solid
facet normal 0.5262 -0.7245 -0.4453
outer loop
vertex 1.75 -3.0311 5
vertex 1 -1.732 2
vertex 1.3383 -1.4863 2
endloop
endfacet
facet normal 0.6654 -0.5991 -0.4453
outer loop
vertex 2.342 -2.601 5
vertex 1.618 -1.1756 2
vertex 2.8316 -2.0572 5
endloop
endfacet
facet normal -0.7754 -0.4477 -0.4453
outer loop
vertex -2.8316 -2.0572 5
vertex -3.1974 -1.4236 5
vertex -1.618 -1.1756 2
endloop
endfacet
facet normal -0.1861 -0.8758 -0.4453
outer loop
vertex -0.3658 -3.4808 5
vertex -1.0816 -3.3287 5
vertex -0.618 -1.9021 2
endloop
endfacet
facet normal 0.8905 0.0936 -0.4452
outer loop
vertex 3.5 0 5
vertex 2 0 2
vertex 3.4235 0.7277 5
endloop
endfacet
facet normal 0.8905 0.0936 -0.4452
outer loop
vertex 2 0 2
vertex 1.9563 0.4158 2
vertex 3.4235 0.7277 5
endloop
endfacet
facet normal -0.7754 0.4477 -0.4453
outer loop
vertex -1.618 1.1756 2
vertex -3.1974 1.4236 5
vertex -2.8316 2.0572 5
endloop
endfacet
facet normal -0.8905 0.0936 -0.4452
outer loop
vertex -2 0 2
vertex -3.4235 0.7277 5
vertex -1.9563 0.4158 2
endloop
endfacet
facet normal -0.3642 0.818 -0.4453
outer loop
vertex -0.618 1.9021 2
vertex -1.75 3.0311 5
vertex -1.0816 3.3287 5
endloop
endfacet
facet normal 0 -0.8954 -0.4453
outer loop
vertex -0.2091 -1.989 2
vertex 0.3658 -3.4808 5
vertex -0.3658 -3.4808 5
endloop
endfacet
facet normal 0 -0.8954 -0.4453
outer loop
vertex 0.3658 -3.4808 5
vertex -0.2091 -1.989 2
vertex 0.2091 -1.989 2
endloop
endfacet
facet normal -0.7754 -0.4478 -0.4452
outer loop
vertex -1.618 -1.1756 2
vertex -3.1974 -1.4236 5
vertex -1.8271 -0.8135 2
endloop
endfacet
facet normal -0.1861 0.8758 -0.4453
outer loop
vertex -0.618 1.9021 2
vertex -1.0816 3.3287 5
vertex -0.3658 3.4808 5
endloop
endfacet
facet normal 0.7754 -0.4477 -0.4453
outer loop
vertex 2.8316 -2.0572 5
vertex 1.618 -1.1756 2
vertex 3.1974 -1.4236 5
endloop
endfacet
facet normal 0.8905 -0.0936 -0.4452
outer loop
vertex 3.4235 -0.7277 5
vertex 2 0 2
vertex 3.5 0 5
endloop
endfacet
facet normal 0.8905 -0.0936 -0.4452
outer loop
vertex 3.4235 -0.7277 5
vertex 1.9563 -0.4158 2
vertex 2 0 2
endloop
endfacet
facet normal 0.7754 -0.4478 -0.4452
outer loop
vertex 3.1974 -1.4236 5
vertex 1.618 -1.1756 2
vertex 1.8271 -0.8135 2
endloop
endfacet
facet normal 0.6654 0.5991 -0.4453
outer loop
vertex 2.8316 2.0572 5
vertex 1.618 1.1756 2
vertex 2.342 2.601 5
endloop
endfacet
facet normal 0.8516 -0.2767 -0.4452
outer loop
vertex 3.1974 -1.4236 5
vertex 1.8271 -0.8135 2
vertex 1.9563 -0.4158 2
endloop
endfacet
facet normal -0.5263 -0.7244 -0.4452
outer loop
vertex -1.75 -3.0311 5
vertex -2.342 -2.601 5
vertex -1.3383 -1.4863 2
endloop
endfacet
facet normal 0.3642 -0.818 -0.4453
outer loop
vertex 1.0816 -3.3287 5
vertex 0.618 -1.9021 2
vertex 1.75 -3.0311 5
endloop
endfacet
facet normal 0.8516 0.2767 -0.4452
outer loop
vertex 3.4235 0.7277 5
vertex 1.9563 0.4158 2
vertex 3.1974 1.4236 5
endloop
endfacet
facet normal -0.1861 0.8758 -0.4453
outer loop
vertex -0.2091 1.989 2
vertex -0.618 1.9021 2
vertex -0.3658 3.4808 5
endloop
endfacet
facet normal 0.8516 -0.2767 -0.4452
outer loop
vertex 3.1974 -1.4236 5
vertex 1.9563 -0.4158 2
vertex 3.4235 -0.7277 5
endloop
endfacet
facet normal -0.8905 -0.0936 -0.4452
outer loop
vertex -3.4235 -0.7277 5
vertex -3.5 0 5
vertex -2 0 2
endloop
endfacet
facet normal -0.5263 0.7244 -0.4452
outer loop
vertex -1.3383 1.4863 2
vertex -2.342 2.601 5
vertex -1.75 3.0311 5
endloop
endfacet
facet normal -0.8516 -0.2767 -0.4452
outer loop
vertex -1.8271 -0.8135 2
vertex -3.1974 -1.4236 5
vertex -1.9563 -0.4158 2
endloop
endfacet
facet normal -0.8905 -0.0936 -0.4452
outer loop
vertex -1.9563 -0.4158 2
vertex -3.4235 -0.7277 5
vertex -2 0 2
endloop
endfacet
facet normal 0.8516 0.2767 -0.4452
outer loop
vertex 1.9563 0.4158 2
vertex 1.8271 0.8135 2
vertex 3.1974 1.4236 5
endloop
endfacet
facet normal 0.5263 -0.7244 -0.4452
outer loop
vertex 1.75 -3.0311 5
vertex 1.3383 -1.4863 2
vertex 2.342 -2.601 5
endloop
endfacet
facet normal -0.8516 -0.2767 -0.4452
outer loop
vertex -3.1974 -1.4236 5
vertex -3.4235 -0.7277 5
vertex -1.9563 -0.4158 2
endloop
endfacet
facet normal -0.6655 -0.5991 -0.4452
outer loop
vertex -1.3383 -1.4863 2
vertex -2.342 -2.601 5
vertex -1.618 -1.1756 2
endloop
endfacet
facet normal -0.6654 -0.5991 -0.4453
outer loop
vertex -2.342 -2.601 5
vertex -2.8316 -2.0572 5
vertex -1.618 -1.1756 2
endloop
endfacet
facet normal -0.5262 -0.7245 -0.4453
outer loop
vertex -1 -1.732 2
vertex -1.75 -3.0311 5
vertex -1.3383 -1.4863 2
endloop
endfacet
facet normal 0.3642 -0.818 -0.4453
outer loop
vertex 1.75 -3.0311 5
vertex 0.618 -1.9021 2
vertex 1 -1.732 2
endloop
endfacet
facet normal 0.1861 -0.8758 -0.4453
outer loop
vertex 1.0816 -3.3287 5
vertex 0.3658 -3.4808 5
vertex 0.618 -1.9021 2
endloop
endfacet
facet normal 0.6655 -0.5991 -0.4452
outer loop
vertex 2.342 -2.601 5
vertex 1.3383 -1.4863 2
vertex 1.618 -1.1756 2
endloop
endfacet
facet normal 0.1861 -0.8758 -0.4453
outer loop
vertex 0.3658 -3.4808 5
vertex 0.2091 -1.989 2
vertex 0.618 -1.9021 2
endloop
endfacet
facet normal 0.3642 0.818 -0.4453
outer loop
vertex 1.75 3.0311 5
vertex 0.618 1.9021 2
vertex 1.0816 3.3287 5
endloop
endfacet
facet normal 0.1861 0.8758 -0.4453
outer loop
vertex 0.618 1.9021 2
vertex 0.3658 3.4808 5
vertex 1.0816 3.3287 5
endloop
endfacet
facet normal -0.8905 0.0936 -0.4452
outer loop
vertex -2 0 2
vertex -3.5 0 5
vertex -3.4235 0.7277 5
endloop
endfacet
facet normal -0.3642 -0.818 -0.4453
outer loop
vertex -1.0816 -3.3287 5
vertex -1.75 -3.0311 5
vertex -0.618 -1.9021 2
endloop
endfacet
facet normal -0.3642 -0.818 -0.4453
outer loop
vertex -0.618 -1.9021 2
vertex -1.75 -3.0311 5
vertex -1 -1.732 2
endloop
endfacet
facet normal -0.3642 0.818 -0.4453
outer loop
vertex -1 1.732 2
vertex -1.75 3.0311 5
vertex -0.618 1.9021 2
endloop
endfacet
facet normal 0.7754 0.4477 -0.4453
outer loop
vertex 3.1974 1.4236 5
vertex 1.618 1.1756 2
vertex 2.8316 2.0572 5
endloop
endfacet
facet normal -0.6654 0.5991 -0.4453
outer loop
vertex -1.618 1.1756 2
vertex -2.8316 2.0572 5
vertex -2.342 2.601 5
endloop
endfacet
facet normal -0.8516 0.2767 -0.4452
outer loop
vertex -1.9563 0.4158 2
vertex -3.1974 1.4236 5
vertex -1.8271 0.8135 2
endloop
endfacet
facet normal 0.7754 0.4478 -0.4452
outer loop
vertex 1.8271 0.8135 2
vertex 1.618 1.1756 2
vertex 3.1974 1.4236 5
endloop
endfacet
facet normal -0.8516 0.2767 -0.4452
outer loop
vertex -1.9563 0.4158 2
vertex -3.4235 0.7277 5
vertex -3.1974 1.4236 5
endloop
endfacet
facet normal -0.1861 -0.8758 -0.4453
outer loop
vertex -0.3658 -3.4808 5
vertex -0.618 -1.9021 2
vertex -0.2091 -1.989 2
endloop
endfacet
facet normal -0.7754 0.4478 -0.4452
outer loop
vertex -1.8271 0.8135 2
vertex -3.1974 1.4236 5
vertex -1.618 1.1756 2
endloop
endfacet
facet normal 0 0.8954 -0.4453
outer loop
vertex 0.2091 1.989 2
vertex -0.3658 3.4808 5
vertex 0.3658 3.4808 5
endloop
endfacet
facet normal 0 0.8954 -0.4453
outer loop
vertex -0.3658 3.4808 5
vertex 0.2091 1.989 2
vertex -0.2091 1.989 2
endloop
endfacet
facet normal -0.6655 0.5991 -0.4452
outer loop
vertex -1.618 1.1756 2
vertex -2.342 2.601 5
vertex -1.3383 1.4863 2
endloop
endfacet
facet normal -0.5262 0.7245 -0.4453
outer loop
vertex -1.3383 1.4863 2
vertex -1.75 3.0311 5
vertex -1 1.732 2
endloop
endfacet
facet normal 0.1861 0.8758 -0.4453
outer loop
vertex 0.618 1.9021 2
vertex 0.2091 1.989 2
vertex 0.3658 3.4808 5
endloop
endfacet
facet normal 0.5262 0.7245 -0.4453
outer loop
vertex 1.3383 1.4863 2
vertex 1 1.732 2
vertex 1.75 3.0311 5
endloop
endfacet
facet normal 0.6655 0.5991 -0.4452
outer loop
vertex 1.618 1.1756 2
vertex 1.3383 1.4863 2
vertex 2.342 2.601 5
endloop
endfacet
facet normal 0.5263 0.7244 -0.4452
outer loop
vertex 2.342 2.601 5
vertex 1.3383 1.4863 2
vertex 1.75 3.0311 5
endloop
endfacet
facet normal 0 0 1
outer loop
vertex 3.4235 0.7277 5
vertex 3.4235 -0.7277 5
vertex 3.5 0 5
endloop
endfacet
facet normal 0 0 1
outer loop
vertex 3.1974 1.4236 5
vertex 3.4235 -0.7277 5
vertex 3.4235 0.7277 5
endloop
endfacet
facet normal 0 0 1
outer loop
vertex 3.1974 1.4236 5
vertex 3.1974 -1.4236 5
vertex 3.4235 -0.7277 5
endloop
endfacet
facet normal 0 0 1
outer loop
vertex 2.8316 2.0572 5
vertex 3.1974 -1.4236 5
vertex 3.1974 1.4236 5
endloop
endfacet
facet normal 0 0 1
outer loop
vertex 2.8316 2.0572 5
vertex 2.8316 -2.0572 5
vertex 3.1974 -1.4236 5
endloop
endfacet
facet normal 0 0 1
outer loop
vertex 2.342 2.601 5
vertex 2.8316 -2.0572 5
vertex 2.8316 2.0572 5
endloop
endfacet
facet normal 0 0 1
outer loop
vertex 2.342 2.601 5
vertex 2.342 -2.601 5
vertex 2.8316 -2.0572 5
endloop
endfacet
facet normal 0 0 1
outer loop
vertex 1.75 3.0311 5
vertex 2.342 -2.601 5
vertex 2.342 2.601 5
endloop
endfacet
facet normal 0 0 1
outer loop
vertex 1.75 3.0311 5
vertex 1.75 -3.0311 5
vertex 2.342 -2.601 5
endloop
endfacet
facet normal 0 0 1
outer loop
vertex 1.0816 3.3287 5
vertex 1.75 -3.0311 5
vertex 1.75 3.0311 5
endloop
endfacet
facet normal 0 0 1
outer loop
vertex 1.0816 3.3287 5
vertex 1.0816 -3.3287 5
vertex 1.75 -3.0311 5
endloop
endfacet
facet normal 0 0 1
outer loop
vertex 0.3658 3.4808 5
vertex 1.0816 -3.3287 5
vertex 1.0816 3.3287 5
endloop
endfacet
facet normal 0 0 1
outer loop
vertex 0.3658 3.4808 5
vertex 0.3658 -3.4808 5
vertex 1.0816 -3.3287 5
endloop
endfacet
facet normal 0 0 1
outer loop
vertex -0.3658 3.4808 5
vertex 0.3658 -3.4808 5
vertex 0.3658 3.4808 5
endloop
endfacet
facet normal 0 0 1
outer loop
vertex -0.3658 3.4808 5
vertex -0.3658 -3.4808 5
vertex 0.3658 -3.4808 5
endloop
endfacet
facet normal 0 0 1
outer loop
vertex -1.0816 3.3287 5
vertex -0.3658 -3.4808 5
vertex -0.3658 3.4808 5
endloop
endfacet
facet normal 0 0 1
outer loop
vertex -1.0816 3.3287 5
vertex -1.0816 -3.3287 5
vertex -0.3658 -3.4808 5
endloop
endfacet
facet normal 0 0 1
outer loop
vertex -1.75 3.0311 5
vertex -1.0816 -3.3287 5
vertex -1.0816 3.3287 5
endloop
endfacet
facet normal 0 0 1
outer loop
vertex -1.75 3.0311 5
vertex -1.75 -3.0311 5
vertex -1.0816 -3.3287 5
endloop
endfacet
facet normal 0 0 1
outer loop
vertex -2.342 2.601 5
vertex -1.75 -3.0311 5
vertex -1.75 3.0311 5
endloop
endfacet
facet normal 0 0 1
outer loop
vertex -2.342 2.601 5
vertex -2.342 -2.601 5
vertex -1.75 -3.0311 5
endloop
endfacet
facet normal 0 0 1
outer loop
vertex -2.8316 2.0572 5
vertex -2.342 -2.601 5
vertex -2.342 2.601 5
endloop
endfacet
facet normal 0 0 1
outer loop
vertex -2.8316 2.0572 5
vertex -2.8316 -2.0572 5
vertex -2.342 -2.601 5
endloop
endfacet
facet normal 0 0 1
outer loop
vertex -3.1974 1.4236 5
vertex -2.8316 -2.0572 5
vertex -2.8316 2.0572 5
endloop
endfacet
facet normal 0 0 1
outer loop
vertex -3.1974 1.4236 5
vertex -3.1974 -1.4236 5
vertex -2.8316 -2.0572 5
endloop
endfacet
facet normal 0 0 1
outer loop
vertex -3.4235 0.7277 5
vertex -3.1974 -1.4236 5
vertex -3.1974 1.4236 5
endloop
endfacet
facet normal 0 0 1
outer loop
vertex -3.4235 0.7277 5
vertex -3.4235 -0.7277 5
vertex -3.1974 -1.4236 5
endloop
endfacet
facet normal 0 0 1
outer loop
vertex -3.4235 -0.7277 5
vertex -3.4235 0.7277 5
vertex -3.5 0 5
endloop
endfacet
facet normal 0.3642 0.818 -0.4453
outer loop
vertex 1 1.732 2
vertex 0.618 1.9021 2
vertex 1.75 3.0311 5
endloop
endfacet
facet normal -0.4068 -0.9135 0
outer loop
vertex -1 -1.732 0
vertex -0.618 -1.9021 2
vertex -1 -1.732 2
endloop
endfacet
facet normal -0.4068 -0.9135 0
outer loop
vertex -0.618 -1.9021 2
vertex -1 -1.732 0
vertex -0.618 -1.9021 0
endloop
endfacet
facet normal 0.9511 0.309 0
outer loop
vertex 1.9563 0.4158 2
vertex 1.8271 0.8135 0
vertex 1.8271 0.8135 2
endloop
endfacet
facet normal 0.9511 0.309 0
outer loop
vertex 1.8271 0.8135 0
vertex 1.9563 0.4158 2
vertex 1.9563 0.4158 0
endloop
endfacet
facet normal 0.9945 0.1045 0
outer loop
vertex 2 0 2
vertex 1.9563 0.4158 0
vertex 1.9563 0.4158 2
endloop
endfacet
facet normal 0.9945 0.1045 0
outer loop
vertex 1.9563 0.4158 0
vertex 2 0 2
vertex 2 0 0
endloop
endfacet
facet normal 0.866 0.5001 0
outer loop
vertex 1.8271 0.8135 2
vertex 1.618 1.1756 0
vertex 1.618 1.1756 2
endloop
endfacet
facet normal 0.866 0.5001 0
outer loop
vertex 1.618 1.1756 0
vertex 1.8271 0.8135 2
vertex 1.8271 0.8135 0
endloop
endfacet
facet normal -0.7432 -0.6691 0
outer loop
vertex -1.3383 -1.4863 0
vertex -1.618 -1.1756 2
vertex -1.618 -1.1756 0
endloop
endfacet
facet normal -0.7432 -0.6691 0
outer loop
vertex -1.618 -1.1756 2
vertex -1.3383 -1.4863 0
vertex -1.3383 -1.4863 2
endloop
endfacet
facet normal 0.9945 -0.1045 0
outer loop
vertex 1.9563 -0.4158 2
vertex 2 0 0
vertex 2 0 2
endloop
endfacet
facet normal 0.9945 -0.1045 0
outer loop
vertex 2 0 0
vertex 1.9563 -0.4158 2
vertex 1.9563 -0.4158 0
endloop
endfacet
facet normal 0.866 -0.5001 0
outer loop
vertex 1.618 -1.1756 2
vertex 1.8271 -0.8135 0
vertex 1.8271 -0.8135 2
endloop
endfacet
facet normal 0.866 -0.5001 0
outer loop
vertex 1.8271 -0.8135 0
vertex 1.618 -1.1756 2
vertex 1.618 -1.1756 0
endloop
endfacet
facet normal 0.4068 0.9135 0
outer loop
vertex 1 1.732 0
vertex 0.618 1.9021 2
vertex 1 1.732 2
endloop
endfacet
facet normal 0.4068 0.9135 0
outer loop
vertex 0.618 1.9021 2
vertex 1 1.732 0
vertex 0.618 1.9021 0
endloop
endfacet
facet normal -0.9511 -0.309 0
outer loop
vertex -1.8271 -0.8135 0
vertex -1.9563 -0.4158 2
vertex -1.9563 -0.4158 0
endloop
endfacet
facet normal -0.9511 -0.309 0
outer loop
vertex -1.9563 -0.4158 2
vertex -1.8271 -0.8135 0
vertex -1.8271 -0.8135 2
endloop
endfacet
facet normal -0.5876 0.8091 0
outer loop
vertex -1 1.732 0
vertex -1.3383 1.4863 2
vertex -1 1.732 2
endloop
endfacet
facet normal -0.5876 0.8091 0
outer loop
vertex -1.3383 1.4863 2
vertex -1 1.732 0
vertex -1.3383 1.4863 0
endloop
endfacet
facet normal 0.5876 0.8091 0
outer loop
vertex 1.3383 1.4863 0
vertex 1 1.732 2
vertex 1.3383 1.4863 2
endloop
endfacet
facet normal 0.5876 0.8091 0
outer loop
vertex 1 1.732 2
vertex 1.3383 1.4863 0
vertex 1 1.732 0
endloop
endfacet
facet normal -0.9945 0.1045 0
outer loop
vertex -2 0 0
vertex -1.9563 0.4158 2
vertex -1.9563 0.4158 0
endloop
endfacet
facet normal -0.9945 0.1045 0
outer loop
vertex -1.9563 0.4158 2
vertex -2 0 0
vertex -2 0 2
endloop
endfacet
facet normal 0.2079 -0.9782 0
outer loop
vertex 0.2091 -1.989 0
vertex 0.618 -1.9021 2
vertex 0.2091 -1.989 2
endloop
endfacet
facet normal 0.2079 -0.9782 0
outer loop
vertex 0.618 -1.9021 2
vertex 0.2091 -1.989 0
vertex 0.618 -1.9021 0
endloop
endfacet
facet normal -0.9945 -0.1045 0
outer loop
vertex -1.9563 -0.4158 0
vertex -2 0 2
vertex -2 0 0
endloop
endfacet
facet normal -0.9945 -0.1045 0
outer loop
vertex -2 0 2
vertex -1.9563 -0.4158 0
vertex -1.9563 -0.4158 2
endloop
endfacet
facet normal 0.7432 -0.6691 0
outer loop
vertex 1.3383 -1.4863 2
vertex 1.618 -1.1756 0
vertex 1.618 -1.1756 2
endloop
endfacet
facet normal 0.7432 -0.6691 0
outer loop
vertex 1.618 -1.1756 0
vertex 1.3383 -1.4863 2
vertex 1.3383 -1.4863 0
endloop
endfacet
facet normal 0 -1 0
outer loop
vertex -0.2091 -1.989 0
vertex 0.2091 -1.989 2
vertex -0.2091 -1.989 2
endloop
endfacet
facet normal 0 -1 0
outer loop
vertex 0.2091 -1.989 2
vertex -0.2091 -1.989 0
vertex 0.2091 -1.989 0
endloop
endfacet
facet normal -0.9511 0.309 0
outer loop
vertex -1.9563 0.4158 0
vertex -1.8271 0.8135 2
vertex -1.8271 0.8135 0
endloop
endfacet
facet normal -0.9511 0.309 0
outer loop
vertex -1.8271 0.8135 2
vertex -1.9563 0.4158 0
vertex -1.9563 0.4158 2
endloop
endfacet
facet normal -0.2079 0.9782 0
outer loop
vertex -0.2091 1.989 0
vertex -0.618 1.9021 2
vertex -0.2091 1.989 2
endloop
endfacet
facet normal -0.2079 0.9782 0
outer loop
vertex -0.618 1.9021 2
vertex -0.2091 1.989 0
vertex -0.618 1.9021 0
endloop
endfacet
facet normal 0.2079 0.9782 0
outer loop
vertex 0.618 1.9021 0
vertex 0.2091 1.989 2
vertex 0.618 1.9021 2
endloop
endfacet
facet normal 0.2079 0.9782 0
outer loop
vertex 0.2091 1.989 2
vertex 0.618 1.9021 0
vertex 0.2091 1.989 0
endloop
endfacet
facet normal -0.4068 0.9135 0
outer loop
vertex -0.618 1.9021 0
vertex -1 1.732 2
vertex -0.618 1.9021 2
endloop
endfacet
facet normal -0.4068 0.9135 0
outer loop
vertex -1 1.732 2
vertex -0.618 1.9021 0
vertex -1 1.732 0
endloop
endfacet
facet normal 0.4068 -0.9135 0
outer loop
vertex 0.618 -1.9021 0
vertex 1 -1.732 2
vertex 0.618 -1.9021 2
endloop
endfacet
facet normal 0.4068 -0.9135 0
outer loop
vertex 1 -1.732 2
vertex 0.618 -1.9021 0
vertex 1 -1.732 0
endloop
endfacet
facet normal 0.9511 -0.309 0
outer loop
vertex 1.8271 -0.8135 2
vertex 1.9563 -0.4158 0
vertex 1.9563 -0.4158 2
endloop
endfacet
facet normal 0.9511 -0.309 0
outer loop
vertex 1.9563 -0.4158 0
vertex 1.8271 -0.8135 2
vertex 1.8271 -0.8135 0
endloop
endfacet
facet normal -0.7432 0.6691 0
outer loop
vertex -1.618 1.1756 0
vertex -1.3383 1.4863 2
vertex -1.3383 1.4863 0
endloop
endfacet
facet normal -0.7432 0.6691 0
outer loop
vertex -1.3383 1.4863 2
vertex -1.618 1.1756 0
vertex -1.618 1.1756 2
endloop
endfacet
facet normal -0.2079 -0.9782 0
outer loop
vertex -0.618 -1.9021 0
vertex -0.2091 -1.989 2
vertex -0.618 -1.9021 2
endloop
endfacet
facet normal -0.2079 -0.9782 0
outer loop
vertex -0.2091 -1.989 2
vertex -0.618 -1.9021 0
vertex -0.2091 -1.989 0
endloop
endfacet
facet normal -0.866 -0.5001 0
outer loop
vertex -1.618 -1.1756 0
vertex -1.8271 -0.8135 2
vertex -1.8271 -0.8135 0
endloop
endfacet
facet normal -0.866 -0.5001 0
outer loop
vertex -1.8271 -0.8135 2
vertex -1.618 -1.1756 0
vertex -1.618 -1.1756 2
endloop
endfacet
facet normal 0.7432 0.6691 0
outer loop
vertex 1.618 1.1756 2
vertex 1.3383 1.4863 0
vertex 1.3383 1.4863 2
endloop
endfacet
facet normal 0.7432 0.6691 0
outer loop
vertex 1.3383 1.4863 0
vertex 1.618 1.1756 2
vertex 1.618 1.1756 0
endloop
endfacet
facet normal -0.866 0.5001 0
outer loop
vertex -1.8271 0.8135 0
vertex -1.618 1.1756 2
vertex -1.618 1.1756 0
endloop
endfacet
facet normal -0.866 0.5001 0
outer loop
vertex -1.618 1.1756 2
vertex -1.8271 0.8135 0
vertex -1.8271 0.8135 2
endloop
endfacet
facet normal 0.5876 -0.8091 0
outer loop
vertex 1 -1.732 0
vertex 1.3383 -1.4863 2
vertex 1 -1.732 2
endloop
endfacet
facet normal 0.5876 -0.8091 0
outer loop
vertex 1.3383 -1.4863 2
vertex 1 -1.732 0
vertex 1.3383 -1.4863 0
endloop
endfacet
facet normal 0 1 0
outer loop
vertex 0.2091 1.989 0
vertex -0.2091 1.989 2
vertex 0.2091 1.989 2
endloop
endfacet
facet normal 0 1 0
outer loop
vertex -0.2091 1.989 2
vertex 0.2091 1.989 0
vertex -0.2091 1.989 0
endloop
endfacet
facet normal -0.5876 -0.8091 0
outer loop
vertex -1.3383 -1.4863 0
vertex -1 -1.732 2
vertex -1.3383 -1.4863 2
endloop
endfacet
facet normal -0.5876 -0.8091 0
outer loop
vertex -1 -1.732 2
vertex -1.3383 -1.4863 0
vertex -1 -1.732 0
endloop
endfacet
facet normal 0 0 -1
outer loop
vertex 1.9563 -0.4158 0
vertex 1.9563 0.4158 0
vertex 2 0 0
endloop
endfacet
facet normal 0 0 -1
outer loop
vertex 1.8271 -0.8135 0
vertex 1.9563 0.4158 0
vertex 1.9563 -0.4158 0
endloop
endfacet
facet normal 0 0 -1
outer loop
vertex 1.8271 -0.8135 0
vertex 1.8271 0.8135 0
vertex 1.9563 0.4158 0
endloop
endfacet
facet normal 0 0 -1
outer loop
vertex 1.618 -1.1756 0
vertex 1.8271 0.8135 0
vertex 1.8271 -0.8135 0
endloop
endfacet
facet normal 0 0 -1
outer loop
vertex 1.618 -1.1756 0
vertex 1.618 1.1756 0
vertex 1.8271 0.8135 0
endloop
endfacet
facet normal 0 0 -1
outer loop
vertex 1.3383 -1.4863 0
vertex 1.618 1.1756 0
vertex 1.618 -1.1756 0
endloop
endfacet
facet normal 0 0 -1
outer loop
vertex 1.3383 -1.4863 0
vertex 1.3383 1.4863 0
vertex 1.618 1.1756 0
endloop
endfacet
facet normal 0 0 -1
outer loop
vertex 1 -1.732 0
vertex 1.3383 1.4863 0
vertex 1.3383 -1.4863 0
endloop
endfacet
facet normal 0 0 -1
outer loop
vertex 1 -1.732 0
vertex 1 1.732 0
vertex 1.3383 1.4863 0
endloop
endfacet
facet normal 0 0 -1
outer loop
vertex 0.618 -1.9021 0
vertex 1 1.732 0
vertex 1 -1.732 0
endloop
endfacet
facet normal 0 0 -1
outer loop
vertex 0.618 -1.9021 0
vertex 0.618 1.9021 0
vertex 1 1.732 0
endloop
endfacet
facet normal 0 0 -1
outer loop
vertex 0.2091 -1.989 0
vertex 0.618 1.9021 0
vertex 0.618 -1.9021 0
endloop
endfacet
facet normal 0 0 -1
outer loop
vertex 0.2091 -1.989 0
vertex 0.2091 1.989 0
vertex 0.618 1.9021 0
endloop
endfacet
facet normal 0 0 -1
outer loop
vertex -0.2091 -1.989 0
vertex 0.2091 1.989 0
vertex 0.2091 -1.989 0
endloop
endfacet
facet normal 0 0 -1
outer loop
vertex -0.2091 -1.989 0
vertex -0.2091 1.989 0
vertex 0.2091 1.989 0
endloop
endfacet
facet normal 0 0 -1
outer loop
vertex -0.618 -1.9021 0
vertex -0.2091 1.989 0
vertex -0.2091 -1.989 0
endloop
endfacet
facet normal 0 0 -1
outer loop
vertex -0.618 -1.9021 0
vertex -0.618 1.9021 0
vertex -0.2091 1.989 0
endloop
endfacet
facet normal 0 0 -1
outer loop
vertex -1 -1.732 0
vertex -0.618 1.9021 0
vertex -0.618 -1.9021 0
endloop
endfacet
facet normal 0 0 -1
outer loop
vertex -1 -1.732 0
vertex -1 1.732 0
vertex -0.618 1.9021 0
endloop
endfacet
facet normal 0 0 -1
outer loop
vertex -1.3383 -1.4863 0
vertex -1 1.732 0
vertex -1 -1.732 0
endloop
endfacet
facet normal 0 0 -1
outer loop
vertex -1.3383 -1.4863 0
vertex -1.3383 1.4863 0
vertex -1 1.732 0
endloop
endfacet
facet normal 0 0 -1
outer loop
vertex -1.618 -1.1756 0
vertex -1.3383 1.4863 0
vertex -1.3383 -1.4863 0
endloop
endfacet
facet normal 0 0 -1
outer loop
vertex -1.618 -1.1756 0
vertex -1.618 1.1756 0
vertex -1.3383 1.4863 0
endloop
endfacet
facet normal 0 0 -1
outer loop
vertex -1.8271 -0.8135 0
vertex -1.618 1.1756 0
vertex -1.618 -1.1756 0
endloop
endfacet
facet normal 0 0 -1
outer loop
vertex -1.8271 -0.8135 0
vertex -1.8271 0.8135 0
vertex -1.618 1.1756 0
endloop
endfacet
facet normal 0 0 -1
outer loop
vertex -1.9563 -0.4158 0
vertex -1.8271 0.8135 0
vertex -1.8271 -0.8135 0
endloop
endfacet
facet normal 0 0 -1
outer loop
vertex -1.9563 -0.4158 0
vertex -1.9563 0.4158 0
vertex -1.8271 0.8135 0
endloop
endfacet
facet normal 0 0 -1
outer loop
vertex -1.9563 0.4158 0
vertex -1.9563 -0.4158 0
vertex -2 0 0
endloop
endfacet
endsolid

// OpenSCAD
// Create geometry for a countersunk hole
module countersunk_hole(head_diameter = 7,
                        bolt_diameter = 4,
                        hole_depth = 5,
                        countersink_depth = 3,
                        self_tapping = false) {

   // Allow for self-tapping if required
   bolt_hole_diameter = (self_tapping == true) ? 0.7 * bolt_diameter : bolt_diameter;

   // If the hole depth required is deeper than the countersink, we need an extra straight part.
   straight_part_depth = hole_depth - countersink_depth;
   assert(straight_part_depth >= 0);

   translate([0, 0, straight_part_depth]) {
      cylinder(r1 = bolt_hole_diameter / 2, r2 = head_diameter / 2, h = countersink_depth);
   }
   cylinder(r = bolt_hole_diameter / 2, h = straight_part_depth);
}

// Test code
$fs = 0.15;
countersunk_hole();
